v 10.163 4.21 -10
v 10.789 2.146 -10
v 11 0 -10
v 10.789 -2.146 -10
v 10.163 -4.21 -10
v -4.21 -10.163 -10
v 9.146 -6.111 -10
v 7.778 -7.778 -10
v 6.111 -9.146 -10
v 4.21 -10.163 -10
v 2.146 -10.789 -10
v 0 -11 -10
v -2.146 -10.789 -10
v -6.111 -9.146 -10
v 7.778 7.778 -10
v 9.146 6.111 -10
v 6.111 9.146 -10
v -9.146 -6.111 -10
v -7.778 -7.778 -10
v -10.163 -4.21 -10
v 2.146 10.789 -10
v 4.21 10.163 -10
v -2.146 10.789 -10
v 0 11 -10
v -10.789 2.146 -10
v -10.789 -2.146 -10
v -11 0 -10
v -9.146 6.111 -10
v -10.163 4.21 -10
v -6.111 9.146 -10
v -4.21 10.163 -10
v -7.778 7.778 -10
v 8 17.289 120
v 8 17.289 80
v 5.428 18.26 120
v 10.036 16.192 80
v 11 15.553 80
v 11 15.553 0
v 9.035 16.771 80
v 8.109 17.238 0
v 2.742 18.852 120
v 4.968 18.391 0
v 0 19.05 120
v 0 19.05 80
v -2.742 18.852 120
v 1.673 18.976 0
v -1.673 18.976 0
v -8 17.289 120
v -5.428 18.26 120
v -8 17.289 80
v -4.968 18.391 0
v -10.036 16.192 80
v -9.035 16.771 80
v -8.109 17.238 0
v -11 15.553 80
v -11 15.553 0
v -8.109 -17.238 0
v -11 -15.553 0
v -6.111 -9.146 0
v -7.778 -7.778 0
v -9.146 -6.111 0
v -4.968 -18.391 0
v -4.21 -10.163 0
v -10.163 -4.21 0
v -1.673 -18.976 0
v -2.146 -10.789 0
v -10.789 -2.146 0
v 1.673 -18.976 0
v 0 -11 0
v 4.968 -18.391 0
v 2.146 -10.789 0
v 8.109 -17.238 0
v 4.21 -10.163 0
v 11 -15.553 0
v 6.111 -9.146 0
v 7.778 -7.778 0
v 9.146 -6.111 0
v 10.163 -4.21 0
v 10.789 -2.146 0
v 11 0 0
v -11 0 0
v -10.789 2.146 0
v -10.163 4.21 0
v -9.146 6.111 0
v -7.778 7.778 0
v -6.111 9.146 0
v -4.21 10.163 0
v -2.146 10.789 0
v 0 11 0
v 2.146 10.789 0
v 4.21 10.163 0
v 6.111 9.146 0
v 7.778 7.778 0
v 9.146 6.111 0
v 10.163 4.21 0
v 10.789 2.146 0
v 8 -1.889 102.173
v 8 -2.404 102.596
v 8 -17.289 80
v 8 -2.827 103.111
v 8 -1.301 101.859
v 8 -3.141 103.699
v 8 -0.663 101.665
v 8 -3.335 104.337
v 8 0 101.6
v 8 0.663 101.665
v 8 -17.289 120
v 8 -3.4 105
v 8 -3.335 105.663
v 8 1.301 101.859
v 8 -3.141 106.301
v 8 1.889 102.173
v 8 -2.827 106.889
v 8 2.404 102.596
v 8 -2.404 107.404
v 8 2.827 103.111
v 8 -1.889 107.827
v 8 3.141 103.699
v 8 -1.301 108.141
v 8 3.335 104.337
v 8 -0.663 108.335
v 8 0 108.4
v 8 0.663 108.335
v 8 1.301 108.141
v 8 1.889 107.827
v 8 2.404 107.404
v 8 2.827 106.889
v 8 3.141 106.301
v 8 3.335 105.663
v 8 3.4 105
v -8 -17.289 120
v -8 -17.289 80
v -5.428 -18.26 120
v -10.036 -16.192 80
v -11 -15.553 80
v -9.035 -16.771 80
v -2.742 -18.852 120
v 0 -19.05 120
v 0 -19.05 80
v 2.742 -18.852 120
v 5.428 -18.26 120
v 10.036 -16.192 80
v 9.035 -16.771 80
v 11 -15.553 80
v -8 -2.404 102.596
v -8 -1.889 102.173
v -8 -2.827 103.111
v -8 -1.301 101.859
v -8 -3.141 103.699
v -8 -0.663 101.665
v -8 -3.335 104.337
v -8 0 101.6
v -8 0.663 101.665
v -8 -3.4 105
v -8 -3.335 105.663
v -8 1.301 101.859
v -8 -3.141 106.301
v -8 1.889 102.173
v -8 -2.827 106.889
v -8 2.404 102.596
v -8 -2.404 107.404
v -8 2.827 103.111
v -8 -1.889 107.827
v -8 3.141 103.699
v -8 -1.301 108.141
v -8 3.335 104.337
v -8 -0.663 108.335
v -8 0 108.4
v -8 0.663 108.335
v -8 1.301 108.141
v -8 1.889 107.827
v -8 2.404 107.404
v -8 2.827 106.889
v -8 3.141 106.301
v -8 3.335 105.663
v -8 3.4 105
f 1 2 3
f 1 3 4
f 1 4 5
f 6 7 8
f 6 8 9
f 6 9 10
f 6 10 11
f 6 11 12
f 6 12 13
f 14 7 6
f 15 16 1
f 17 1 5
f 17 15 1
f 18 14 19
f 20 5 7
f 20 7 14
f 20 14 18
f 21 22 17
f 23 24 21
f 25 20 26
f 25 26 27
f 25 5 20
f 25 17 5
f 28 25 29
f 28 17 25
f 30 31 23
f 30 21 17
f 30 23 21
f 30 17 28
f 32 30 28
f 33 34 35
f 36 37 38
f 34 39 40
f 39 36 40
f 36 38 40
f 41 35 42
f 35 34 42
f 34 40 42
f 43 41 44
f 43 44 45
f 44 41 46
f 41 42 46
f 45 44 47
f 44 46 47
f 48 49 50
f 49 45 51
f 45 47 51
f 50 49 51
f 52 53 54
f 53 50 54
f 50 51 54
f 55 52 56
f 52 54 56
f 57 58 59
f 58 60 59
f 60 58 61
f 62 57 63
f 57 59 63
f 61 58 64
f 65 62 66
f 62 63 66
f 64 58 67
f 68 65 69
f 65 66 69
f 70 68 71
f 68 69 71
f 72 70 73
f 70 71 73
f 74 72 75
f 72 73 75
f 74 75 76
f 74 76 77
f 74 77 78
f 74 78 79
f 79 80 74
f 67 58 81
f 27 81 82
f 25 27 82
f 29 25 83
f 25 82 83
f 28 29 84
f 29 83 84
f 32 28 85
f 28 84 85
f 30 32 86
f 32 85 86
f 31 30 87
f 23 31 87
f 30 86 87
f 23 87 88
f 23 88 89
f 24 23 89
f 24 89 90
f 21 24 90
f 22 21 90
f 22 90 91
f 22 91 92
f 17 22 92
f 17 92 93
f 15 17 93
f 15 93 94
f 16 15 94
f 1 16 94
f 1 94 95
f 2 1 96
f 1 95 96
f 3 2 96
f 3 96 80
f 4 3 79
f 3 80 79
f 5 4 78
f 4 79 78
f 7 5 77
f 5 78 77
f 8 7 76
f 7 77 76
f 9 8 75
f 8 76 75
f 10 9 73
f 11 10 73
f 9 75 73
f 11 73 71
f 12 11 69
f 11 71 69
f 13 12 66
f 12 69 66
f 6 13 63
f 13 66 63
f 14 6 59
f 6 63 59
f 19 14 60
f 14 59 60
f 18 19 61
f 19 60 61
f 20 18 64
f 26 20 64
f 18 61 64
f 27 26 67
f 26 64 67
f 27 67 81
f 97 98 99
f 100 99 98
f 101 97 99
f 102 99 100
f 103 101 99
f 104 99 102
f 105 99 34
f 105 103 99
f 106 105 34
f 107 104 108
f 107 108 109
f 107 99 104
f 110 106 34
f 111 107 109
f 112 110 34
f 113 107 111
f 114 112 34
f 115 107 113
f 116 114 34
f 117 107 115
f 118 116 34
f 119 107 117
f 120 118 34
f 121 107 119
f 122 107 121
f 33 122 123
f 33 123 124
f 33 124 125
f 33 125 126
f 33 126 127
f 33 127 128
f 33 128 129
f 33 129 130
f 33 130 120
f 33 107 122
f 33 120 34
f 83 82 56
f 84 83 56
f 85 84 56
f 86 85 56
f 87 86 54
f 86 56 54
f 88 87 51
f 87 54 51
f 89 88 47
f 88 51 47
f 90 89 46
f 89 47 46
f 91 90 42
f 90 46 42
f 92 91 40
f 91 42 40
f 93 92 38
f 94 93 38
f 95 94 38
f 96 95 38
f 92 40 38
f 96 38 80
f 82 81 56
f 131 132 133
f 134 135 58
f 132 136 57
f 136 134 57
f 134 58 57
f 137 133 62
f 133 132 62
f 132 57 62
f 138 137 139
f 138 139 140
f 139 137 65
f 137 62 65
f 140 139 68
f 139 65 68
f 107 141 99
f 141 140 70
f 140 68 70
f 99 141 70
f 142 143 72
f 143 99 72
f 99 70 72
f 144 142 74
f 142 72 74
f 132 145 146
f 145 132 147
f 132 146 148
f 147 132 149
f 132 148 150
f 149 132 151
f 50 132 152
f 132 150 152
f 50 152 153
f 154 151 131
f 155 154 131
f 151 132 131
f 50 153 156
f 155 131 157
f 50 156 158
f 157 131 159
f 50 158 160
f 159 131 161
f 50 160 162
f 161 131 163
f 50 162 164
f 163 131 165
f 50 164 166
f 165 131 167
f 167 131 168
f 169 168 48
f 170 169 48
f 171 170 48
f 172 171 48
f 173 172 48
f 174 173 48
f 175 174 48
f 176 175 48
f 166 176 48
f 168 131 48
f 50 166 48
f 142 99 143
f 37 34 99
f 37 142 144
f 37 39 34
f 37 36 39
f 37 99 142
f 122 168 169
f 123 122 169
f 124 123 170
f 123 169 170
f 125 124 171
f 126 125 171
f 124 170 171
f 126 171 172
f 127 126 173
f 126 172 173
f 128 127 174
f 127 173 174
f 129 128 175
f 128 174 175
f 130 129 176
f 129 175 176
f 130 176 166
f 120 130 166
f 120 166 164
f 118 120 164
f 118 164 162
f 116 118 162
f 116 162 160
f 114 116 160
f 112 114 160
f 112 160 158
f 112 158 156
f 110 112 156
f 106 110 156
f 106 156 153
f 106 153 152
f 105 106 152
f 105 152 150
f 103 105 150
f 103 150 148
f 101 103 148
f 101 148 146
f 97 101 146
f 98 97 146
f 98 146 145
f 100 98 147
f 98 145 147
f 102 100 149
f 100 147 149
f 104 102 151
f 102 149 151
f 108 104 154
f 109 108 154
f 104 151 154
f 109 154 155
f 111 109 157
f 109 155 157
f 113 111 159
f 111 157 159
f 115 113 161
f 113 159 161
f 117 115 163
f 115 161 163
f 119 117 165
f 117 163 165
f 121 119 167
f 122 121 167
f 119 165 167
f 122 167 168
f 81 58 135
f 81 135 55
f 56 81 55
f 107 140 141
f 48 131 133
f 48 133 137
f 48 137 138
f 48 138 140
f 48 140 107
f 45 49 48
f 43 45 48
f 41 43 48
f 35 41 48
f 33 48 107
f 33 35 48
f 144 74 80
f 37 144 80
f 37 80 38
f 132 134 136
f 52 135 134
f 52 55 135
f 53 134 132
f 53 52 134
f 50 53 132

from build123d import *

# Parameters (mm, degrees)
SKETCH1_R              = 19.05
BOSS_EXTRUDE1_DEPTH    = 120
SKETCH4_R              = 11
BOSS_EXTRUDE2_DEPTH    = 10
SKETCH8_OUTSIDE_W      = 68.244
SKETCH8_OUTSIDE_H      = 68.244
SKETCH8_OUTSIDE_W_2    = 22
SKETCH8_OUTSIDE_H_2    = 38.1
CUT_EXTRUDE2_DEPTH     = 123.987011509
SKETCH2_OUTSIDE_W      = 51.448
SKETCH2_OUTSIDE_H      = 67.548
SKETCH2_OUTSIDE_W_2    = 16
SKETCH2_OUTSIDE_H_2    = 38.1
CUT_EXTRUDE1_DEPTH     = 40
M8X1_25_TAPPED_HOLE1_D = 6.8


with BuildPart() as part:
    # Sketch1 → Boss-Extrude1 (new body)
    with BuildSketch(Plane.XY):
        Circle(SKETCH1_R)
    extrude(amount=BOSS_EXTRUDE1_DEPTH)

    # Sketch4 → Boss-Extrude2 (add)
    with BuildSketch(Plane(origin=(0, 0, 0), x_dir=(-1, 0, 0), z_dir=(0, 0, -1))):
        Circle(SKETCH4_R)
    extrude(amount=BOSS_EXTRUDE2_DEPTH)

    # Sketch8 outside → Cut-Extrude2 (cut, through all)
    with BuildSketch(Plane(origin=(0, 0, 0), x_dir=(-1, 0, 0), z_dir=(0, 0, -1))):
        Rectangle(SKETCH8_OUTSIDE_W, SKETCH8_OUTSIDE_H)
        Rectangle(SKETCH8_OUTSIDE_W_2, SKETCH8_OUTSIDE_H_2, mode=Mode.SUBTRACT)
    extrude(amount=-CUT_EXTRUDE2_DEPTH, mode=Mode.SUBTRACT)

    # Sketch2 outside → Cut-Extrude1 (cut)
    with BuildSketch(Plane.XY.offset(120)):
        Rectangle(SKETCH2_OUTSIDE_W, SKETCH2_OUTSIDE_H)
        Rectangle(SKETCH2_OUTSIDE_W_2, SKETCH2_OUTSIDE_H_2, mode=Mode.SUBTRACT)
    extrude(amount=-CUT_EXTRUDE1_DEPTH, mode=Mode.SUBTRACT)

    # M8x1.25 Tapped Hole1 (through all)
    with Locations(Plane(origin=(8, 0, 0), x_dir=(0, 0, -1), z_dir=(1, 0, 0))):
        with Locations((-105, 0)):
            Hole(M8X1_25_TAPPED_HOLE1_D / 2)


solid = part.part
